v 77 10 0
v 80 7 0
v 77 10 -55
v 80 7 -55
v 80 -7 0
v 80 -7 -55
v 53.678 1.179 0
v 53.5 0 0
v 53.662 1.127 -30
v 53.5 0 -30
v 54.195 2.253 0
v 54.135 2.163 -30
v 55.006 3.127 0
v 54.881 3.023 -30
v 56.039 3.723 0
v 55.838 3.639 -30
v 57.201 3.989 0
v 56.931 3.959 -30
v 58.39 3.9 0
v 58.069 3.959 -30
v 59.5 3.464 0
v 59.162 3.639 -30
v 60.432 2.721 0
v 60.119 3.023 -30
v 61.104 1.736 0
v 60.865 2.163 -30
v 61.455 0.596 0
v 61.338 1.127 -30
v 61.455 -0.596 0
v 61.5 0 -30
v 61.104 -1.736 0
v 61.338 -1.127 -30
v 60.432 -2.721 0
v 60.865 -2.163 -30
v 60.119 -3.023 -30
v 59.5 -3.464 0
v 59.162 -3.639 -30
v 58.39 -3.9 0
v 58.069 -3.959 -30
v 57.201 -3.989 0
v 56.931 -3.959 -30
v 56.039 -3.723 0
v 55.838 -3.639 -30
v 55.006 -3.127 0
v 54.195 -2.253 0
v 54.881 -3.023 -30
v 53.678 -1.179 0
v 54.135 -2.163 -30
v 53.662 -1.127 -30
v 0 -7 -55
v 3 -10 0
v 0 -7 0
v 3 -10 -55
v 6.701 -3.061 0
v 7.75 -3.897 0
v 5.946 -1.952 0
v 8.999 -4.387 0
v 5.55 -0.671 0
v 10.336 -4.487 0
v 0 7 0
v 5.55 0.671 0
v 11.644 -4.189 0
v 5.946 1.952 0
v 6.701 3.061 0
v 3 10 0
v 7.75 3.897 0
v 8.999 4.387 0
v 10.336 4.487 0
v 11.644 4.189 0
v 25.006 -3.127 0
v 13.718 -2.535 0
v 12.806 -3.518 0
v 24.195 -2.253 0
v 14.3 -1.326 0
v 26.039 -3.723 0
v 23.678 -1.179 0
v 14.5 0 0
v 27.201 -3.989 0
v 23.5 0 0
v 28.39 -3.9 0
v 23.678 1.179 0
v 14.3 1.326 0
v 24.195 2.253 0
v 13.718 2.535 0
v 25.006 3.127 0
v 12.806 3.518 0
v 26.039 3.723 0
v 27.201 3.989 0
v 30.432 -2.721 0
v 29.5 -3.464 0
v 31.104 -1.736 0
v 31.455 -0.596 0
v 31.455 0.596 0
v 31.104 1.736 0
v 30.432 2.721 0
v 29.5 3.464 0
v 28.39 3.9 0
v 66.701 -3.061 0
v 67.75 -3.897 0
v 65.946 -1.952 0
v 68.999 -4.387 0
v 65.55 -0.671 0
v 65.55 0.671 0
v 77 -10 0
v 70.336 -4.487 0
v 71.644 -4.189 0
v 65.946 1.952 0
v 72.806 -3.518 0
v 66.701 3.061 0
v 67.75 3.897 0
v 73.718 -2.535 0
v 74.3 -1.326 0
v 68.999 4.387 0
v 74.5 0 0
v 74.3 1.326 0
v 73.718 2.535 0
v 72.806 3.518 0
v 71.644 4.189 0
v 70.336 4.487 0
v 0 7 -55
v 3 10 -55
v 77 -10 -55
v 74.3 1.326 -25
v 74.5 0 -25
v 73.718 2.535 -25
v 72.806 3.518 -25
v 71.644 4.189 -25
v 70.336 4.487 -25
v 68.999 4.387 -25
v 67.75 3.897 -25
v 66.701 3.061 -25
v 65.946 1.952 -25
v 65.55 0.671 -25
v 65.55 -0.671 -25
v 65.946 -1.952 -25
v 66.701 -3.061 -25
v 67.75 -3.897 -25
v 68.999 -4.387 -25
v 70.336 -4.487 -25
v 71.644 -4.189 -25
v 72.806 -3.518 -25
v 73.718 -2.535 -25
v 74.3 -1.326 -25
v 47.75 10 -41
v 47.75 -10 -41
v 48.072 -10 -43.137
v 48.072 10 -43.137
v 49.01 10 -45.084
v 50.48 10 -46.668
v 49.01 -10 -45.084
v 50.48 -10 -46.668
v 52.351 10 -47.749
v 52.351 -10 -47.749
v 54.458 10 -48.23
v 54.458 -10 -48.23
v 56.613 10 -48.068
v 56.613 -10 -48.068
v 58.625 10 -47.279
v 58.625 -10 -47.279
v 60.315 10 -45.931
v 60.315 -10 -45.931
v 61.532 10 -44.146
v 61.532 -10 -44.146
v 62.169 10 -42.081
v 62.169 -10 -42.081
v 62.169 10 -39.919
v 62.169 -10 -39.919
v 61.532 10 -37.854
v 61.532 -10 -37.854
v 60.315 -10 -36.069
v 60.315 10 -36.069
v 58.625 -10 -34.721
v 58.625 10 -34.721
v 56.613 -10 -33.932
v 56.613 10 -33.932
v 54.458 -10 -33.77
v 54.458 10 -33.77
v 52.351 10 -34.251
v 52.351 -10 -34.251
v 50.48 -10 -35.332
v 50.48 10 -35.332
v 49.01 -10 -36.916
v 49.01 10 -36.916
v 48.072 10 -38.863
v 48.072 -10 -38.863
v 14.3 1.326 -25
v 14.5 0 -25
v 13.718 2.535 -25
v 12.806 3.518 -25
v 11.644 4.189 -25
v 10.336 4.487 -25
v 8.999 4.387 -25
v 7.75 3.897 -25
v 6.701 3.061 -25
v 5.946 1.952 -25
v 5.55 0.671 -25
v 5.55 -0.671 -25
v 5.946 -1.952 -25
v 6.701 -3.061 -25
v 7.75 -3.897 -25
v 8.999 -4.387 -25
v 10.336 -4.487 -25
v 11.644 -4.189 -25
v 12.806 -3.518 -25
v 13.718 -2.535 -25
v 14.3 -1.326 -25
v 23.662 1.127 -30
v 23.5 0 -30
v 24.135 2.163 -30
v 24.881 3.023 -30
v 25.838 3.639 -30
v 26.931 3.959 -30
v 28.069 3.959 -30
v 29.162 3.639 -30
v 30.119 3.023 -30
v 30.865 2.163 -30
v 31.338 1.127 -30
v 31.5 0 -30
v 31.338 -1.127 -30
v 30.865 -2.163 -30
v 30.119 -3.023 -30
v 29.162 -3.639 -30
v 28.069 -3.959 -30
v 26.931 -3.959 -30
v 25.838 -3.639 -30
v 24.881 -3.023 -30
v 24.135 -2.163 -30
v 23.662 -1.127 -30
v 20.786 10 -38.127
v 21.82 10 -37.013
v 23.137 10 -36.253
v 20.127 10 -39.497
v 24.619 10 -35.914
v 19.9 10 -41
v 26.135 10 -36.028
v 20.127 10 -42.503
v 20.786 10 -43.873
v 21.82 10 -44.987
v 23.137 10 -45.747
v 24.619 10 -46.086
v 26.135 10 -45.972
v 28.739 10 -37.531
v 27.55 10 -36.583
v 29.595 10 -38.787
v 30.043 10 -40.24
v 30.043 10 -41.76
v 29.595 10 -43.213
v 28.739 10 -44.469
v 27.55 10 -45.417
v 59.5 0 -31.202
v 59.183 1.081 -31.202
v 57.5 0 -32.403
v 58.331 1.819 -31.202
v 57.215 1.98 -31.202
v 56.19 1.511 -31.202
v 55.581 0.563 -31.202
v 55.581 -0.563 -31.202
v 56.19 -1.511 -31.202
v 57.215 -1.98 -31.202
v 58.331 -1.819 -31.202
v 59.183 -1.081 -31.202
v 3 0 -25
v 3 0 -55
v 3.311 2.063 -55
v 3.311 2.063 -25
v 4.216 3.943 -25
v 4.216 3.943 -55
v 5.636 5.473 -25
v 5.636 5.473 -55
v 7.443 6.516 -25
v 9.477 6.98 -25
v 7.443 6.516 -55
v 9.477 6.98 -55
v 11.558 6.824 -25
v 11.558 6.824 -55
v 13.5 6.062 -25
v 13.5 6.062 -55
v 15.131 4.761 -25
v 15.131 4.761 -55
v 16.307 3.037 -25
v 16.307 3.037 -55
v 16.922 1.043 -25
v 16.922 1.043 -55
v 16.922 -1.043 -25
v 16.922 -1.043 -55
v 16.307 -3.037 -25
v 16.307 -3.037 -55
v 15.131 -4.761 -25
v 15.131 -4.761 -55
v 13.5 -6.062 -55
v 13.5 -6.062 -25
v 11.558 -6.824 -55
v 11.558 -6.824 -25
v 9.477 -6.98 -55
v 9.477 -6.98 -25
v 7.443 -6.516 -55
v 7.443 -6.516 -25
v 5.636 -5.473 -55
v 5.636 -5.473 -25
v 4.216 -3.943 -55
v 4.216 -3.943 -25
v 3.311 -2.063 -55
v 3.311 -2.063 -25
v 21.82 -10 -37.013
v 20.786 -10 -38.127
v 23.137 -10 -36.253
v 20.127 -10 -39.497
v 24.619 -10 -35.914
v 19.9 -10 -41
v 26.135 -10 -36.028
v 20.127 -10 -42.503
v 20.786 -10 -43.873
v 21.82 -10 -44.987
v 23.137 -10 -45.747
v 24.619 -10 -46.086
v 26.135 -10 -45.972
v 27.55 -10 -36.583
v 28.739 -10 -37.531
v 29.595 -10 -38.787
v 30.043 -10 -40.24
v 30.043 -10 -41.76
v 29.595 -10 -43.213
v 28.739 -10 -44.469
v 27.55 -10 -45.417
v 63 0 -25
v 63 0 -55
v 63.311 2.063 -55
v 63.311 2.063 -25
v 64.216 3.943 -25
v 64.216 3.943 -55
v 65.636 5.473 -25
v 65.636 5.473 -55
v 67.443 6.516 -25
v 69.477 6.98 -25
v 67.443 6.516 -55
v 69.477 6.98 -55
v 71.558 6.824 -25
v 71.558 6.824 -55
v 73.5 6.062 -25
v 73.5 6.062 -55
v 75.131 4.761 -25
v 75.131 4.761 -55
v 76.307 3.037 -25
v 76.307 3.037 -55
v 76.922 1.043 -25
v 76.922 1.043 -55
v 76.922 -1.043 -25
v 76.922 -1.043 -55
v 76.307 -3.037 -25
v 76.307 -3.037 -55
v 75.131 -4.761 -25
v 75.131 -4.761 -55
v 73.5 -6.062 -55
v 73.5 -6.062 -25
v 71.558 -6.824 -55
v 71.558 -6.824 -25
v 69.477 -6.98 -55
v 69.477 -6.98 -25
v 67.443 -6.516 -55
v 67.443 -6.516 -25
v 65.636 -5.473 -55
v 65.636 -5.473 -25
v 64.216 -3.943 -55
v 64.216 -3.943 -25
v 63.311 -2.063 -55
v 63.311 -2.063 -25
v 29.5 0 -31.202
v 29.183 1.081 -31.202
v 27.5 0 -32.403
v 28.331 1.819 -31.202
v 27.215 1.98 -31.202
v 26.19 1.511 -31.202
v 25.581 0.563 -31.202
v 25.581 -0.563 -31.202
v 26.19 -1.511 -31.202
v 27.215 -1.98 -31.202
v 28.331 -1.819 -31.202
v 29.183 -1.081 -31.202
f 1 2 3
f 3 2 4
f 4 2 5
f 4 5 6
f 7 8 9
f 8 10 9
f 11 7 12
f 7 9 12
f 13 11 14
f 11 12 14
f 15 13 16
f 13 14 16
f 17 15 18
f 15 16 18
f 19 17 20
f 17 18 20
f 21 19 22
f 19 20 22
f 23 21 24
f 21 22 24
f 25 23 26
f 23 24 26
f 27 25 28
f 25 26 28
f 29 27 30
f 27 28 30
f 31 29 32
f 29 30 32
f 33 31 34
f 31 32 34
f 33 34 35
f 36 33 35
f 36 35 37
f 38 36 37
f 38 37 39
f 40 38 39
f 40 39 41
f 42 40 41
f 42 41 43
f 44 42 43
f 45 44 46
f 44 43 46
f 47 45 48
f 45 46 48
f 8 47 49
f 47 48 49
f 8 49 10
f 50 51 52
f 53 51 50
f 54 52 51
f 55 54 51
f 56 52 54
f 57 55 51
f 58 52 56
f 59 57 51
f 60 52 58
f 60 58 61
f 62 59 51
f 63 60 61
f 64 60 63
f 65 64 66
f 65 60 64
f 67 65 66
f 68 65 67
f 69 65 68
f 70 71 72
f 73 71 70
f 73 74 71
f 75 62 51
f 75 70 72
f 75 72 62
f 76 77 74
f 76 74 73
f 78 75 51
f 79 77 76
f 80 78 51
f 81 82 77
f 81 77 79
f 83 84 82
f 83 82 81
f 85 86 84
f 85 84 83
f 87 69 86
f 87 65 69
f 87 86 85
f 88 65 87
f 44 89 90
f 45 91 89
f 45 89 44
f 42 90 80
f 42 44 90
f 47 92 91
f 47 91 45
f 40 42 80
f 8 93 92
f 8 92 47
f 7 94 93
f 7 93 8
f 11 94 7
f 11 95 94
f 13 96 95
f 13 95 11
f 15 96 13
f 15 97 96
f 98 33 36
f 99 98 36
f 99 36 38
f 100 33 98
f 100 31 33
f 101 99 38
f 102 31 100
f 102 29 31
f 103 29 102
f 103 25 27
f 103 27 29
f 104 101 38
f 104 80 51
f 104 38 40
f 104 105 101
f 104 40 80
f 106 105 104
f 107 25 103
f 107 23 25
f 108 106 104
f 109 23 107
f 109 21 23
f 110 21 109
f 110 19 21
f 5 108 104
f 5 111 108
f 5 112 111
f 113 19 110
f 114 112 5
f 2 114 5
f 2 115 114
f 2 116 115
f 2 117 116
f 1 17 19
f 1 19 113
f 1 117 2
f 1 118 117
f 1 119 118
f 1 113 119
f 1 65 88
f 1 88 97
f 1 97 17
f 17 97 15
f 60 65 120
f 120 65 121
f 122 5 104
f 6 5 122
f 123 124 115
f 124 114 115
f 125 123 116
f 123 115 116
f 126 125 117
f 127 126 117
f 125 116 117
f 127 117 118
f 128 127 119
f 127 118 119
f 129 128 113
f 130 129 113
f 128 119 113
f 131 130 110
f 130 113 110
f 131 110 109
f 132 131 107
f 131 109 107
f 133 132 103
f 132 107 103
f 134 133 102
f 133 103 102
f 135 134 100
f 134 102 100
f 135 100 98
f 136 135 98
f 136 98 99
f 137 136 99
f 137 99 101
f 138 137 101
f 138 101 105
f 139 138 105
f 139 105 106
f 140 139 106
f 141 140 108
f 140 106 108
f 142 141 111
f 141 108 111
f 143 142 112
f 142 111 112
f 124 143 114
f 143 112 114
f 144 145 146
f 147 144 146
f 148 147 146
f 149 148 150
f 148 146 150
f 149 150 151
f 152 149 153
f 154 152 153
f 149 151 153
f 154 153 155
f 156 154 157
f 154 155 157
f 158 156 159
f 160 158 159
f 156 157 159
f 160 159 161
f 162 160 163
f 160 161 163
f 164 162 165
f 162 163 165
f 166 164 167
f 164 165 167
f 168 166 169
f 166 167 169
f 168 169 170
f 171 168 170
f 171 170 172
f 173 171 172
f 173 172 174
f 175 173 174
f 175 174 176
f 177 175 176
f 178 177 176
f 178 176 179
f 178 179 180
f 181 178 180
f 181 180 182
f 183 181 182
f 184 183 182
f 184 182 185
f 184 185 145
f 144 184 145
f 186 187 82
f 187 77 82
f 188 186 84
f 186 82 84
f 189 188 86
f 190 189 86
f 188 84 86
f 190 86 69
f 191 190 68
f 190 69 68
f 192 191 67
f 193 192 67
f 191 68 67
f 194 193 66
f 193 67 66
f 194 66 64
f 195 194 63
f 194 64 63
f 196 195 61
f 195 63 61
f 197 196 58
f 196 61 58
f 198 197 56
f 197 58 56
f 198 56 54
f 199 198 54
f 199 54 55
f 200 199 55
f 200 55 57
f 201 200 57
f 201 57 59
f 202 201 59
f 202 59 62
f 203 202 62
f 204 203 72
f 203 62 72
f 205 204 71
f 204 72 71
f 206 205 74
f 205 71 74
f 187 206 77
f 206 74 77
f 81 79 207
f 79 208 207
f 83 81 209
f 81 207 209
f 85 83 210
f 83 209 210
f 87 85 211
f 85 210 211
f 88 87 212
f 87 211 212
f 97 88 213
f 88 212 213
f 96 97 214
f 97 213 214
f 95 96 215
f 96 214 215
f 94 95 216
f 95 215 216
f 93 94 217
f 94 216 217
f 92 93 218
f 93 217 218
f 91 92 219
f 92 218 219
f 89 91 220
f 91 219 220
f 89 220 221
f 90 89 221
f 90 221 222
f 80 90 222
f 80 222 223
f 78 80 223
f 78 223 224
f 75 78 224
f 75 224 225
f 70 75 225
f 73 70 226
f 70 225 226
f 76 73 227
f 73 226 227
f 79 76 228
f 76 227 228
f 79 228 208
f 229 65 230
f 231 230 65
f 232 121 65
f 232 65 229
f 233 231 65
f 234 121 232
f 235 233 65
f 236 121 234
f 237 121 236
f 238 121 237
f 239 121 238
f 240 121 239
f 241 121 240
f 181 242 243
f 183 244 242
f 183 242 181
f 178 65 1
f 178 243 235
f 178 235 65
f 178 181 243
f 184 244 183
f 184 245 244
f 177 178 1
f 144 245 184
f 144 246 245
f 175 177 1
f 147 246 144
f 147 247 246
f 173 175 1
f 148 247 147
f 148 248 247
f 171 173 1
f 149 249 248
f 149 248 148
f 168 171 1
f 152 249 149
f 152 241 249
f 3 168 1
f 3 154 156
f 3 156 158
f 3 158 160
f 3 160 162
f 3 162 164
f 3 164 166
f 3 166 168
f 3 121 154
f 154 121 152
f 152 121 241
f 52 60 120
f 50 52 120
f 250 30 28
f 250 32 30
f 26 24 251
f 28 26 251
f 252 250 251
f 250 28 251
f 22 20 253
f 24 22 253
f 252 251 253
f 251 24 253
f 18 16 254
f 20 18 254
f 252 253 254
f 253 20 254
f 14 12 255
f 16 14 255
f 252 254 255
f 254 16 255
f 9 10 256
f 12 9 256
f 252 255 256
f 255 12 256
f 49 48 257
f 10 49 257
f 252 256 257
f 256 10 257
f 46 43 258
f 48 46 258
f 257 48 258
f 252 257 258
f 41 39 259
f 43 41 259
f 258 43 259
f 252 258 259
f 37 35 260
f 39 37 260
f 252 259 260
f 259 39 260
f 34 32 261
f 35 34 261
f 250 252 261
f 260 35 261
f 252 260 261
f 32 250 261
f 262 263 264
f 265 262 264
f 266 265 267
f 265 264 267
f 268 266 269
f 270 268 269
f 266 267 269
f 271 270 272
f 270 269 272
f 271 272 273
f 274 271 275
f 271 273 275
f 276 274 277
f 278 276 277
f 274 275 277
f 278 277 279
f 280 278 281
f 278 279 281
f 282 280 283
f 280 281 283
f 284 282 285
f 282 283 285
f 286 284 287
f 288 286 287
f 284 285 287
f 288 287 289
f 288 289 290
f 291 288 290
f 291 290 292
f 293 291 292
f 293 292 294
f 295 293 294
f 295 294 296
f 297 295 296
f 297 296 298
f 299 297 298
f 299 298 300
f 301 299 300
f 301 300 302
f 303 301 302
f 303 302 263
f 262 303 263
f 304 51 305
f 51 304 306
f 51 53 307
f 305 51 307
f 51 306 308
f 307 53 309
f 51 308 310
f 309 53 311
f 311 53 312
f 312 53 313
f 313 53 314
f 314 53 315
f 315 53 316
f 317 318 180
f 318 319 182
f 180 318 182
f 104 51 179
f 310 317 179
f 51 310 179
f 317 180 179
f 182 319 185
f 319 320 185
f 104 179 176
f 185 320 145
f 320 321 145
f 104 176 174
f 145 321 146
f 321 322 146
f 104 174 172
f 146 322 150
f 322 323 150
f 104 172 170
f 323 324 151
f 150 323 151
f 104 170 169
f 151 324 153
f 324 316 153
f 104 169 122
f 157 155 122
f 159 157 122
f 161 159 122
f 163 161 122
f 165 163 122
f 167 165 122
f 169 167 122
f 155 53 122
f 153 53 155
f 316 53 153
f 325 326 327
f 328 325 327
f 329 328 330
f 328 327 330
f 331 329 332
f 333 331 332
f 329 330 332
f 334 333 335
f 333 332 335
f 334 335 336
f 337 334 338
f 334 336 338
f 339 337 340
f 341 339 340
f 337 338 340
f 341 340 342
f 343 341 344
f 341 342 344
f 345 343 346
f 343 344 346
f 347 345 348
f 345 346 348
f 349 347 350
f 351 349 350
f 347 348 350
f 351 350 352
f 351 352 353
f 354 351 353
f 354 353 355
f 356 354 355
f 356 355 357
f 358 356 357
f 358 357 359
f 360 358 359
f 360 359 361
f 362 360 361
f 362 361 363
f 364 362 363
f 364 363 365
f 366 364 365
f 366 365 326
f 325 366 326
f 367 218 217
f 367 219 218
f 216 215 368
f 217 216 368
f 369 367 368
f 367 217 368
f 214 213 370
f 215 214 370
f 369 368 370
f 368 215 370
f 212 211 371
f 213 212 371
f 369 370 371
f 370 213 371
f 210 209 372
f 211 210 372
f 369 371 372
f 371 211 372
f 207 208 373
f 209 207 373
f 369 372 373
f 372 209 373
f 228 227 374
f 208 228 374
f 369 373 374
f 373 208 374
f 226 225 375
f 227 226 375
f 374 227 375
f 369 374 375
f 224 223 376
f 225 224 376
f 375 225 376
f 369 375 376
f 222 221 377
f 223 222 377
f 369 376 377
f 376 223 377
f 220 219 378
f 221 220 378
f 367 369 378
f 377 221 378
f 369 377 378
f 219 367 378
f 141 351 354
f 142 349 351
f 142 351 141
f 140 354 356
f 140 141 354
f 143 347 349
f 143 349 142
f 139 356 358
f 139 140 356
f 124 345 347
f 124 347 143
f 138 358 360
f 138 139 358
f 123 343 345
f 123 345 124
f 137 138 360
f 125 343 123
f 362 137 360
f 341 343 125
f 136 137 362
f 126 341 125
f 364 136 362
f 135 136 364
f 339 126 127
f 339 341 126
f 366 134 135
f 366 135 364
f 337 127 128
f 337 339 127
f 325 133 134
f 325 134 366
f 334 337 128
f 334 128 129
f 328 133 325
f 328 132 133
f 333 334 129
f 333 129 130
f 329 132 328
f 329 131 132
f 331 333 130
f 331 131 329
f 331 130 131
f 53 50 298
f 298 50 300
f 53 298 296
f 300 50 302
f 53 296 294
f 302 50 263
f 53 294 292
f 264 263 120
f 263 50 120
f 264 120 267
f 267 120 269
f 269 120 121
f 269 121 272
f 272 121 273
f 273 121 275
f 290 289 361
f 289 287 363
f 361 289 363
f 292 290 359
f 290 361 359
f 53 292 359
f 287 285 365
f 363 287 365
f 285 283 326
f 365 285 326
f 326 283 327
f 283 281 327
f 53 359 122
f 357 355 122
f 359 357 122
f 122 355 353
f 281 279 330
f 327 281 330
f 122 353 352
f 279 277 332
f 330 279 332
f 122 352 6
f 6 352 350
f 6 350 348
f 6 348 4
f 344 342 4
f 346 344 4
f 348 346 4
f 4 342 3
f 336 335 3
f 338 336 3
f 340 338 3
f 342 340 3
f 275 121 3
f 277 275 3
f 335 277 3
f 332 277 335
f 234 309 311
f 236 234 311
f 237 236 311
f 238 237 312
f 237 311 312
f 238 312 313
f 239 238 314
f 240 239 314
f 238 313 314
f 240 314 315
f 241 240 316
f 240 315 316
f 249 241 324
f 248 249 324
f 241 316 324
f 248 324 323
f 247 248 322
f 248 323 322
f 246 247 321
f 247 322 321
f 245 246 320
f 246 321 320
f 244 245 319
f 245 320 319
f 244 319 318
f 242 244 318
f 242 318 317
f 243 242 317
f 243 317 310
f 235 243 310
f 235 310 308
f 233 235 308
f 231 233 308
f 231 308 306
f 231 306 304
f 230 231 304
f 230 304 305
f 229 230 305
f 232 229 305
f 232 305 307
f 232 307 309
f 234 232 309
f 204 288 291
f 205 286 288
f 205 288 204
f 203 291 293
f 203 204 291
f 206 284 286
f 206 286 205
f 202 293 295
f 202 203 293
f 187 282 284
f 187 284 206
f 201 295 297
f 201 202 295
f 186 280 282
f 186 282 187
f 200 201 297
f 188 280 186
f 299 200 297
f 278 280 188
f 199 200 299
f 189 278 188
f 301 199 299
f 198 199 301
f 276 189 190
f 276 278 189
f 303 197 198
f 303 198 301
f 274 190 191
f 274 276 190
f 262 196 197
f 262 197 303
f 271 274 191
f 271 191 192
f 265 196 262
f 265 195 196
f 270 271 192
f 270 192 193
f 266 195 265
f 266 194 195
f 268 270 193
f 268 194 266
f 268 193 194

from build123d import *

# Parameters (mm, degrees)
SKETCH1_W                                           = 80
SKETCH1_H                                           = 55
BOSS_EXTRUDE1_DEPTH                                 = 10
M12_TAPPED_HOLE1_D                                  = 10.2
M16X1_5_TAPPED_HOLE1_D                              = 14.5
CBORE_FOR_M8_HEX_SOCKET_HEAD_CAP_SCREW2_D           = 9
CBORE_FOR_M8_HEX_SOCKET_HEAD_CAP_SCREW2_CBORE_D     = 14
CBORE_FOR_M8_HEX_SOCKET_HEAD_CAP_SCREW2_CBORE_DEPTH = 30
F_8_0_8_DIAMETER_HOLE1_D                            = 8
F_8_0_8_DIAMETER_HOLE1_DEPTH                        = 30
F_8_0_8_DIAMETER_HOLE1_TIP                          = 2.403442476
CHAMFER1_SIZE                                       = 3


with BuildPart() as part:
    # Sketch1 → Boss-Extrude1 (new, symmetric)
    with BuildSketch(Plane(origin=(0, 0, 0), x_dir=(1, 0, 0), z_dir=(0, 1, 0))):
        with Locations((40, 27.5)):
            Rectangle(SKETCH1_W, SKETCH1_H)
    extrude(amount=BOSS_EXTRUDE1_DEPTH, both=True)

    # M12 Tapped Hole1 (through all)
    with Locations(Plane(origin=(0, 10, 0), x_dir=(1, 0, 0), z_dir=(0, 1, 0))):
        with Locations((25, 41)):
            Hole(M12_TAPPED_HOLE1_D / 2)

    # M16x1.5 Tapped Hole1 (through all)
    with Locations(Plane(origin=(0, 10, 0), x_dir=(1, 0, 0), z_dir=(0, 1, 0))):
        with Locations((55, 41)):
            Hole(M16X1_5_TAPPED_HOLE1_D / 2)

    # CBORE for M8 Hex Socket Head Cap Screw2 (through all)
    with Locations(Plane(origin=(0, 0, -55), x_dir=(-1, 0, 0), z_dir=(0, 0, -1))):
        with Locations((-70, 0), (-10, 0)):
            CounterBoreHole(CBORE_FOR_M8_HEX_SOCKET_HEAD_CAP_SCREW2_D / 2, CBORE_FOR_M8_HEX_SOCKET_HEAD_CAP_SCREW2_CBORE_D / 2, CBORE_FOR_M8_HEX_SOCKET_HEAD_CAP_SCREW2_CBORE_DEPTH)

    # Ø8.0 (8) Diameter Hole1
    with Locations(Plane.XY):
        with Locations((27.5, 0), (57.5, 0)):
            Hole(F_8_0_8_DIAMETER_HOLE1_D / 2, depth=F_8_0_8_DIAMETER_HOLE1_DEPTH)
            with Locations((0, 0, -(F_8_0_8_DIAMETER_HOLE1_DEPTH + F_8_0_8_DIAMETER_HOLE1_TIP / 2))):  # 118° drill point
                Cone(0, F_8_0_8_DIAMETER_HOLE1_D / 2, F_8_0_8_DIAMETER_HOLE1_TIP, mode=Mode.SUBTRACT)

    # Chamfer1
    chamfer1_edges = [part.edges().sort_by_distance(p)[0] for p in [
        (80, 10, -27.5),
        (0, 10, -27.5),
        (80, -10, -27.5),
        (0, -10, -27.5),
    ]]
    chamfer(chamfer1_edges, length=CHAMFER1_SIZE)


solid = part.part
